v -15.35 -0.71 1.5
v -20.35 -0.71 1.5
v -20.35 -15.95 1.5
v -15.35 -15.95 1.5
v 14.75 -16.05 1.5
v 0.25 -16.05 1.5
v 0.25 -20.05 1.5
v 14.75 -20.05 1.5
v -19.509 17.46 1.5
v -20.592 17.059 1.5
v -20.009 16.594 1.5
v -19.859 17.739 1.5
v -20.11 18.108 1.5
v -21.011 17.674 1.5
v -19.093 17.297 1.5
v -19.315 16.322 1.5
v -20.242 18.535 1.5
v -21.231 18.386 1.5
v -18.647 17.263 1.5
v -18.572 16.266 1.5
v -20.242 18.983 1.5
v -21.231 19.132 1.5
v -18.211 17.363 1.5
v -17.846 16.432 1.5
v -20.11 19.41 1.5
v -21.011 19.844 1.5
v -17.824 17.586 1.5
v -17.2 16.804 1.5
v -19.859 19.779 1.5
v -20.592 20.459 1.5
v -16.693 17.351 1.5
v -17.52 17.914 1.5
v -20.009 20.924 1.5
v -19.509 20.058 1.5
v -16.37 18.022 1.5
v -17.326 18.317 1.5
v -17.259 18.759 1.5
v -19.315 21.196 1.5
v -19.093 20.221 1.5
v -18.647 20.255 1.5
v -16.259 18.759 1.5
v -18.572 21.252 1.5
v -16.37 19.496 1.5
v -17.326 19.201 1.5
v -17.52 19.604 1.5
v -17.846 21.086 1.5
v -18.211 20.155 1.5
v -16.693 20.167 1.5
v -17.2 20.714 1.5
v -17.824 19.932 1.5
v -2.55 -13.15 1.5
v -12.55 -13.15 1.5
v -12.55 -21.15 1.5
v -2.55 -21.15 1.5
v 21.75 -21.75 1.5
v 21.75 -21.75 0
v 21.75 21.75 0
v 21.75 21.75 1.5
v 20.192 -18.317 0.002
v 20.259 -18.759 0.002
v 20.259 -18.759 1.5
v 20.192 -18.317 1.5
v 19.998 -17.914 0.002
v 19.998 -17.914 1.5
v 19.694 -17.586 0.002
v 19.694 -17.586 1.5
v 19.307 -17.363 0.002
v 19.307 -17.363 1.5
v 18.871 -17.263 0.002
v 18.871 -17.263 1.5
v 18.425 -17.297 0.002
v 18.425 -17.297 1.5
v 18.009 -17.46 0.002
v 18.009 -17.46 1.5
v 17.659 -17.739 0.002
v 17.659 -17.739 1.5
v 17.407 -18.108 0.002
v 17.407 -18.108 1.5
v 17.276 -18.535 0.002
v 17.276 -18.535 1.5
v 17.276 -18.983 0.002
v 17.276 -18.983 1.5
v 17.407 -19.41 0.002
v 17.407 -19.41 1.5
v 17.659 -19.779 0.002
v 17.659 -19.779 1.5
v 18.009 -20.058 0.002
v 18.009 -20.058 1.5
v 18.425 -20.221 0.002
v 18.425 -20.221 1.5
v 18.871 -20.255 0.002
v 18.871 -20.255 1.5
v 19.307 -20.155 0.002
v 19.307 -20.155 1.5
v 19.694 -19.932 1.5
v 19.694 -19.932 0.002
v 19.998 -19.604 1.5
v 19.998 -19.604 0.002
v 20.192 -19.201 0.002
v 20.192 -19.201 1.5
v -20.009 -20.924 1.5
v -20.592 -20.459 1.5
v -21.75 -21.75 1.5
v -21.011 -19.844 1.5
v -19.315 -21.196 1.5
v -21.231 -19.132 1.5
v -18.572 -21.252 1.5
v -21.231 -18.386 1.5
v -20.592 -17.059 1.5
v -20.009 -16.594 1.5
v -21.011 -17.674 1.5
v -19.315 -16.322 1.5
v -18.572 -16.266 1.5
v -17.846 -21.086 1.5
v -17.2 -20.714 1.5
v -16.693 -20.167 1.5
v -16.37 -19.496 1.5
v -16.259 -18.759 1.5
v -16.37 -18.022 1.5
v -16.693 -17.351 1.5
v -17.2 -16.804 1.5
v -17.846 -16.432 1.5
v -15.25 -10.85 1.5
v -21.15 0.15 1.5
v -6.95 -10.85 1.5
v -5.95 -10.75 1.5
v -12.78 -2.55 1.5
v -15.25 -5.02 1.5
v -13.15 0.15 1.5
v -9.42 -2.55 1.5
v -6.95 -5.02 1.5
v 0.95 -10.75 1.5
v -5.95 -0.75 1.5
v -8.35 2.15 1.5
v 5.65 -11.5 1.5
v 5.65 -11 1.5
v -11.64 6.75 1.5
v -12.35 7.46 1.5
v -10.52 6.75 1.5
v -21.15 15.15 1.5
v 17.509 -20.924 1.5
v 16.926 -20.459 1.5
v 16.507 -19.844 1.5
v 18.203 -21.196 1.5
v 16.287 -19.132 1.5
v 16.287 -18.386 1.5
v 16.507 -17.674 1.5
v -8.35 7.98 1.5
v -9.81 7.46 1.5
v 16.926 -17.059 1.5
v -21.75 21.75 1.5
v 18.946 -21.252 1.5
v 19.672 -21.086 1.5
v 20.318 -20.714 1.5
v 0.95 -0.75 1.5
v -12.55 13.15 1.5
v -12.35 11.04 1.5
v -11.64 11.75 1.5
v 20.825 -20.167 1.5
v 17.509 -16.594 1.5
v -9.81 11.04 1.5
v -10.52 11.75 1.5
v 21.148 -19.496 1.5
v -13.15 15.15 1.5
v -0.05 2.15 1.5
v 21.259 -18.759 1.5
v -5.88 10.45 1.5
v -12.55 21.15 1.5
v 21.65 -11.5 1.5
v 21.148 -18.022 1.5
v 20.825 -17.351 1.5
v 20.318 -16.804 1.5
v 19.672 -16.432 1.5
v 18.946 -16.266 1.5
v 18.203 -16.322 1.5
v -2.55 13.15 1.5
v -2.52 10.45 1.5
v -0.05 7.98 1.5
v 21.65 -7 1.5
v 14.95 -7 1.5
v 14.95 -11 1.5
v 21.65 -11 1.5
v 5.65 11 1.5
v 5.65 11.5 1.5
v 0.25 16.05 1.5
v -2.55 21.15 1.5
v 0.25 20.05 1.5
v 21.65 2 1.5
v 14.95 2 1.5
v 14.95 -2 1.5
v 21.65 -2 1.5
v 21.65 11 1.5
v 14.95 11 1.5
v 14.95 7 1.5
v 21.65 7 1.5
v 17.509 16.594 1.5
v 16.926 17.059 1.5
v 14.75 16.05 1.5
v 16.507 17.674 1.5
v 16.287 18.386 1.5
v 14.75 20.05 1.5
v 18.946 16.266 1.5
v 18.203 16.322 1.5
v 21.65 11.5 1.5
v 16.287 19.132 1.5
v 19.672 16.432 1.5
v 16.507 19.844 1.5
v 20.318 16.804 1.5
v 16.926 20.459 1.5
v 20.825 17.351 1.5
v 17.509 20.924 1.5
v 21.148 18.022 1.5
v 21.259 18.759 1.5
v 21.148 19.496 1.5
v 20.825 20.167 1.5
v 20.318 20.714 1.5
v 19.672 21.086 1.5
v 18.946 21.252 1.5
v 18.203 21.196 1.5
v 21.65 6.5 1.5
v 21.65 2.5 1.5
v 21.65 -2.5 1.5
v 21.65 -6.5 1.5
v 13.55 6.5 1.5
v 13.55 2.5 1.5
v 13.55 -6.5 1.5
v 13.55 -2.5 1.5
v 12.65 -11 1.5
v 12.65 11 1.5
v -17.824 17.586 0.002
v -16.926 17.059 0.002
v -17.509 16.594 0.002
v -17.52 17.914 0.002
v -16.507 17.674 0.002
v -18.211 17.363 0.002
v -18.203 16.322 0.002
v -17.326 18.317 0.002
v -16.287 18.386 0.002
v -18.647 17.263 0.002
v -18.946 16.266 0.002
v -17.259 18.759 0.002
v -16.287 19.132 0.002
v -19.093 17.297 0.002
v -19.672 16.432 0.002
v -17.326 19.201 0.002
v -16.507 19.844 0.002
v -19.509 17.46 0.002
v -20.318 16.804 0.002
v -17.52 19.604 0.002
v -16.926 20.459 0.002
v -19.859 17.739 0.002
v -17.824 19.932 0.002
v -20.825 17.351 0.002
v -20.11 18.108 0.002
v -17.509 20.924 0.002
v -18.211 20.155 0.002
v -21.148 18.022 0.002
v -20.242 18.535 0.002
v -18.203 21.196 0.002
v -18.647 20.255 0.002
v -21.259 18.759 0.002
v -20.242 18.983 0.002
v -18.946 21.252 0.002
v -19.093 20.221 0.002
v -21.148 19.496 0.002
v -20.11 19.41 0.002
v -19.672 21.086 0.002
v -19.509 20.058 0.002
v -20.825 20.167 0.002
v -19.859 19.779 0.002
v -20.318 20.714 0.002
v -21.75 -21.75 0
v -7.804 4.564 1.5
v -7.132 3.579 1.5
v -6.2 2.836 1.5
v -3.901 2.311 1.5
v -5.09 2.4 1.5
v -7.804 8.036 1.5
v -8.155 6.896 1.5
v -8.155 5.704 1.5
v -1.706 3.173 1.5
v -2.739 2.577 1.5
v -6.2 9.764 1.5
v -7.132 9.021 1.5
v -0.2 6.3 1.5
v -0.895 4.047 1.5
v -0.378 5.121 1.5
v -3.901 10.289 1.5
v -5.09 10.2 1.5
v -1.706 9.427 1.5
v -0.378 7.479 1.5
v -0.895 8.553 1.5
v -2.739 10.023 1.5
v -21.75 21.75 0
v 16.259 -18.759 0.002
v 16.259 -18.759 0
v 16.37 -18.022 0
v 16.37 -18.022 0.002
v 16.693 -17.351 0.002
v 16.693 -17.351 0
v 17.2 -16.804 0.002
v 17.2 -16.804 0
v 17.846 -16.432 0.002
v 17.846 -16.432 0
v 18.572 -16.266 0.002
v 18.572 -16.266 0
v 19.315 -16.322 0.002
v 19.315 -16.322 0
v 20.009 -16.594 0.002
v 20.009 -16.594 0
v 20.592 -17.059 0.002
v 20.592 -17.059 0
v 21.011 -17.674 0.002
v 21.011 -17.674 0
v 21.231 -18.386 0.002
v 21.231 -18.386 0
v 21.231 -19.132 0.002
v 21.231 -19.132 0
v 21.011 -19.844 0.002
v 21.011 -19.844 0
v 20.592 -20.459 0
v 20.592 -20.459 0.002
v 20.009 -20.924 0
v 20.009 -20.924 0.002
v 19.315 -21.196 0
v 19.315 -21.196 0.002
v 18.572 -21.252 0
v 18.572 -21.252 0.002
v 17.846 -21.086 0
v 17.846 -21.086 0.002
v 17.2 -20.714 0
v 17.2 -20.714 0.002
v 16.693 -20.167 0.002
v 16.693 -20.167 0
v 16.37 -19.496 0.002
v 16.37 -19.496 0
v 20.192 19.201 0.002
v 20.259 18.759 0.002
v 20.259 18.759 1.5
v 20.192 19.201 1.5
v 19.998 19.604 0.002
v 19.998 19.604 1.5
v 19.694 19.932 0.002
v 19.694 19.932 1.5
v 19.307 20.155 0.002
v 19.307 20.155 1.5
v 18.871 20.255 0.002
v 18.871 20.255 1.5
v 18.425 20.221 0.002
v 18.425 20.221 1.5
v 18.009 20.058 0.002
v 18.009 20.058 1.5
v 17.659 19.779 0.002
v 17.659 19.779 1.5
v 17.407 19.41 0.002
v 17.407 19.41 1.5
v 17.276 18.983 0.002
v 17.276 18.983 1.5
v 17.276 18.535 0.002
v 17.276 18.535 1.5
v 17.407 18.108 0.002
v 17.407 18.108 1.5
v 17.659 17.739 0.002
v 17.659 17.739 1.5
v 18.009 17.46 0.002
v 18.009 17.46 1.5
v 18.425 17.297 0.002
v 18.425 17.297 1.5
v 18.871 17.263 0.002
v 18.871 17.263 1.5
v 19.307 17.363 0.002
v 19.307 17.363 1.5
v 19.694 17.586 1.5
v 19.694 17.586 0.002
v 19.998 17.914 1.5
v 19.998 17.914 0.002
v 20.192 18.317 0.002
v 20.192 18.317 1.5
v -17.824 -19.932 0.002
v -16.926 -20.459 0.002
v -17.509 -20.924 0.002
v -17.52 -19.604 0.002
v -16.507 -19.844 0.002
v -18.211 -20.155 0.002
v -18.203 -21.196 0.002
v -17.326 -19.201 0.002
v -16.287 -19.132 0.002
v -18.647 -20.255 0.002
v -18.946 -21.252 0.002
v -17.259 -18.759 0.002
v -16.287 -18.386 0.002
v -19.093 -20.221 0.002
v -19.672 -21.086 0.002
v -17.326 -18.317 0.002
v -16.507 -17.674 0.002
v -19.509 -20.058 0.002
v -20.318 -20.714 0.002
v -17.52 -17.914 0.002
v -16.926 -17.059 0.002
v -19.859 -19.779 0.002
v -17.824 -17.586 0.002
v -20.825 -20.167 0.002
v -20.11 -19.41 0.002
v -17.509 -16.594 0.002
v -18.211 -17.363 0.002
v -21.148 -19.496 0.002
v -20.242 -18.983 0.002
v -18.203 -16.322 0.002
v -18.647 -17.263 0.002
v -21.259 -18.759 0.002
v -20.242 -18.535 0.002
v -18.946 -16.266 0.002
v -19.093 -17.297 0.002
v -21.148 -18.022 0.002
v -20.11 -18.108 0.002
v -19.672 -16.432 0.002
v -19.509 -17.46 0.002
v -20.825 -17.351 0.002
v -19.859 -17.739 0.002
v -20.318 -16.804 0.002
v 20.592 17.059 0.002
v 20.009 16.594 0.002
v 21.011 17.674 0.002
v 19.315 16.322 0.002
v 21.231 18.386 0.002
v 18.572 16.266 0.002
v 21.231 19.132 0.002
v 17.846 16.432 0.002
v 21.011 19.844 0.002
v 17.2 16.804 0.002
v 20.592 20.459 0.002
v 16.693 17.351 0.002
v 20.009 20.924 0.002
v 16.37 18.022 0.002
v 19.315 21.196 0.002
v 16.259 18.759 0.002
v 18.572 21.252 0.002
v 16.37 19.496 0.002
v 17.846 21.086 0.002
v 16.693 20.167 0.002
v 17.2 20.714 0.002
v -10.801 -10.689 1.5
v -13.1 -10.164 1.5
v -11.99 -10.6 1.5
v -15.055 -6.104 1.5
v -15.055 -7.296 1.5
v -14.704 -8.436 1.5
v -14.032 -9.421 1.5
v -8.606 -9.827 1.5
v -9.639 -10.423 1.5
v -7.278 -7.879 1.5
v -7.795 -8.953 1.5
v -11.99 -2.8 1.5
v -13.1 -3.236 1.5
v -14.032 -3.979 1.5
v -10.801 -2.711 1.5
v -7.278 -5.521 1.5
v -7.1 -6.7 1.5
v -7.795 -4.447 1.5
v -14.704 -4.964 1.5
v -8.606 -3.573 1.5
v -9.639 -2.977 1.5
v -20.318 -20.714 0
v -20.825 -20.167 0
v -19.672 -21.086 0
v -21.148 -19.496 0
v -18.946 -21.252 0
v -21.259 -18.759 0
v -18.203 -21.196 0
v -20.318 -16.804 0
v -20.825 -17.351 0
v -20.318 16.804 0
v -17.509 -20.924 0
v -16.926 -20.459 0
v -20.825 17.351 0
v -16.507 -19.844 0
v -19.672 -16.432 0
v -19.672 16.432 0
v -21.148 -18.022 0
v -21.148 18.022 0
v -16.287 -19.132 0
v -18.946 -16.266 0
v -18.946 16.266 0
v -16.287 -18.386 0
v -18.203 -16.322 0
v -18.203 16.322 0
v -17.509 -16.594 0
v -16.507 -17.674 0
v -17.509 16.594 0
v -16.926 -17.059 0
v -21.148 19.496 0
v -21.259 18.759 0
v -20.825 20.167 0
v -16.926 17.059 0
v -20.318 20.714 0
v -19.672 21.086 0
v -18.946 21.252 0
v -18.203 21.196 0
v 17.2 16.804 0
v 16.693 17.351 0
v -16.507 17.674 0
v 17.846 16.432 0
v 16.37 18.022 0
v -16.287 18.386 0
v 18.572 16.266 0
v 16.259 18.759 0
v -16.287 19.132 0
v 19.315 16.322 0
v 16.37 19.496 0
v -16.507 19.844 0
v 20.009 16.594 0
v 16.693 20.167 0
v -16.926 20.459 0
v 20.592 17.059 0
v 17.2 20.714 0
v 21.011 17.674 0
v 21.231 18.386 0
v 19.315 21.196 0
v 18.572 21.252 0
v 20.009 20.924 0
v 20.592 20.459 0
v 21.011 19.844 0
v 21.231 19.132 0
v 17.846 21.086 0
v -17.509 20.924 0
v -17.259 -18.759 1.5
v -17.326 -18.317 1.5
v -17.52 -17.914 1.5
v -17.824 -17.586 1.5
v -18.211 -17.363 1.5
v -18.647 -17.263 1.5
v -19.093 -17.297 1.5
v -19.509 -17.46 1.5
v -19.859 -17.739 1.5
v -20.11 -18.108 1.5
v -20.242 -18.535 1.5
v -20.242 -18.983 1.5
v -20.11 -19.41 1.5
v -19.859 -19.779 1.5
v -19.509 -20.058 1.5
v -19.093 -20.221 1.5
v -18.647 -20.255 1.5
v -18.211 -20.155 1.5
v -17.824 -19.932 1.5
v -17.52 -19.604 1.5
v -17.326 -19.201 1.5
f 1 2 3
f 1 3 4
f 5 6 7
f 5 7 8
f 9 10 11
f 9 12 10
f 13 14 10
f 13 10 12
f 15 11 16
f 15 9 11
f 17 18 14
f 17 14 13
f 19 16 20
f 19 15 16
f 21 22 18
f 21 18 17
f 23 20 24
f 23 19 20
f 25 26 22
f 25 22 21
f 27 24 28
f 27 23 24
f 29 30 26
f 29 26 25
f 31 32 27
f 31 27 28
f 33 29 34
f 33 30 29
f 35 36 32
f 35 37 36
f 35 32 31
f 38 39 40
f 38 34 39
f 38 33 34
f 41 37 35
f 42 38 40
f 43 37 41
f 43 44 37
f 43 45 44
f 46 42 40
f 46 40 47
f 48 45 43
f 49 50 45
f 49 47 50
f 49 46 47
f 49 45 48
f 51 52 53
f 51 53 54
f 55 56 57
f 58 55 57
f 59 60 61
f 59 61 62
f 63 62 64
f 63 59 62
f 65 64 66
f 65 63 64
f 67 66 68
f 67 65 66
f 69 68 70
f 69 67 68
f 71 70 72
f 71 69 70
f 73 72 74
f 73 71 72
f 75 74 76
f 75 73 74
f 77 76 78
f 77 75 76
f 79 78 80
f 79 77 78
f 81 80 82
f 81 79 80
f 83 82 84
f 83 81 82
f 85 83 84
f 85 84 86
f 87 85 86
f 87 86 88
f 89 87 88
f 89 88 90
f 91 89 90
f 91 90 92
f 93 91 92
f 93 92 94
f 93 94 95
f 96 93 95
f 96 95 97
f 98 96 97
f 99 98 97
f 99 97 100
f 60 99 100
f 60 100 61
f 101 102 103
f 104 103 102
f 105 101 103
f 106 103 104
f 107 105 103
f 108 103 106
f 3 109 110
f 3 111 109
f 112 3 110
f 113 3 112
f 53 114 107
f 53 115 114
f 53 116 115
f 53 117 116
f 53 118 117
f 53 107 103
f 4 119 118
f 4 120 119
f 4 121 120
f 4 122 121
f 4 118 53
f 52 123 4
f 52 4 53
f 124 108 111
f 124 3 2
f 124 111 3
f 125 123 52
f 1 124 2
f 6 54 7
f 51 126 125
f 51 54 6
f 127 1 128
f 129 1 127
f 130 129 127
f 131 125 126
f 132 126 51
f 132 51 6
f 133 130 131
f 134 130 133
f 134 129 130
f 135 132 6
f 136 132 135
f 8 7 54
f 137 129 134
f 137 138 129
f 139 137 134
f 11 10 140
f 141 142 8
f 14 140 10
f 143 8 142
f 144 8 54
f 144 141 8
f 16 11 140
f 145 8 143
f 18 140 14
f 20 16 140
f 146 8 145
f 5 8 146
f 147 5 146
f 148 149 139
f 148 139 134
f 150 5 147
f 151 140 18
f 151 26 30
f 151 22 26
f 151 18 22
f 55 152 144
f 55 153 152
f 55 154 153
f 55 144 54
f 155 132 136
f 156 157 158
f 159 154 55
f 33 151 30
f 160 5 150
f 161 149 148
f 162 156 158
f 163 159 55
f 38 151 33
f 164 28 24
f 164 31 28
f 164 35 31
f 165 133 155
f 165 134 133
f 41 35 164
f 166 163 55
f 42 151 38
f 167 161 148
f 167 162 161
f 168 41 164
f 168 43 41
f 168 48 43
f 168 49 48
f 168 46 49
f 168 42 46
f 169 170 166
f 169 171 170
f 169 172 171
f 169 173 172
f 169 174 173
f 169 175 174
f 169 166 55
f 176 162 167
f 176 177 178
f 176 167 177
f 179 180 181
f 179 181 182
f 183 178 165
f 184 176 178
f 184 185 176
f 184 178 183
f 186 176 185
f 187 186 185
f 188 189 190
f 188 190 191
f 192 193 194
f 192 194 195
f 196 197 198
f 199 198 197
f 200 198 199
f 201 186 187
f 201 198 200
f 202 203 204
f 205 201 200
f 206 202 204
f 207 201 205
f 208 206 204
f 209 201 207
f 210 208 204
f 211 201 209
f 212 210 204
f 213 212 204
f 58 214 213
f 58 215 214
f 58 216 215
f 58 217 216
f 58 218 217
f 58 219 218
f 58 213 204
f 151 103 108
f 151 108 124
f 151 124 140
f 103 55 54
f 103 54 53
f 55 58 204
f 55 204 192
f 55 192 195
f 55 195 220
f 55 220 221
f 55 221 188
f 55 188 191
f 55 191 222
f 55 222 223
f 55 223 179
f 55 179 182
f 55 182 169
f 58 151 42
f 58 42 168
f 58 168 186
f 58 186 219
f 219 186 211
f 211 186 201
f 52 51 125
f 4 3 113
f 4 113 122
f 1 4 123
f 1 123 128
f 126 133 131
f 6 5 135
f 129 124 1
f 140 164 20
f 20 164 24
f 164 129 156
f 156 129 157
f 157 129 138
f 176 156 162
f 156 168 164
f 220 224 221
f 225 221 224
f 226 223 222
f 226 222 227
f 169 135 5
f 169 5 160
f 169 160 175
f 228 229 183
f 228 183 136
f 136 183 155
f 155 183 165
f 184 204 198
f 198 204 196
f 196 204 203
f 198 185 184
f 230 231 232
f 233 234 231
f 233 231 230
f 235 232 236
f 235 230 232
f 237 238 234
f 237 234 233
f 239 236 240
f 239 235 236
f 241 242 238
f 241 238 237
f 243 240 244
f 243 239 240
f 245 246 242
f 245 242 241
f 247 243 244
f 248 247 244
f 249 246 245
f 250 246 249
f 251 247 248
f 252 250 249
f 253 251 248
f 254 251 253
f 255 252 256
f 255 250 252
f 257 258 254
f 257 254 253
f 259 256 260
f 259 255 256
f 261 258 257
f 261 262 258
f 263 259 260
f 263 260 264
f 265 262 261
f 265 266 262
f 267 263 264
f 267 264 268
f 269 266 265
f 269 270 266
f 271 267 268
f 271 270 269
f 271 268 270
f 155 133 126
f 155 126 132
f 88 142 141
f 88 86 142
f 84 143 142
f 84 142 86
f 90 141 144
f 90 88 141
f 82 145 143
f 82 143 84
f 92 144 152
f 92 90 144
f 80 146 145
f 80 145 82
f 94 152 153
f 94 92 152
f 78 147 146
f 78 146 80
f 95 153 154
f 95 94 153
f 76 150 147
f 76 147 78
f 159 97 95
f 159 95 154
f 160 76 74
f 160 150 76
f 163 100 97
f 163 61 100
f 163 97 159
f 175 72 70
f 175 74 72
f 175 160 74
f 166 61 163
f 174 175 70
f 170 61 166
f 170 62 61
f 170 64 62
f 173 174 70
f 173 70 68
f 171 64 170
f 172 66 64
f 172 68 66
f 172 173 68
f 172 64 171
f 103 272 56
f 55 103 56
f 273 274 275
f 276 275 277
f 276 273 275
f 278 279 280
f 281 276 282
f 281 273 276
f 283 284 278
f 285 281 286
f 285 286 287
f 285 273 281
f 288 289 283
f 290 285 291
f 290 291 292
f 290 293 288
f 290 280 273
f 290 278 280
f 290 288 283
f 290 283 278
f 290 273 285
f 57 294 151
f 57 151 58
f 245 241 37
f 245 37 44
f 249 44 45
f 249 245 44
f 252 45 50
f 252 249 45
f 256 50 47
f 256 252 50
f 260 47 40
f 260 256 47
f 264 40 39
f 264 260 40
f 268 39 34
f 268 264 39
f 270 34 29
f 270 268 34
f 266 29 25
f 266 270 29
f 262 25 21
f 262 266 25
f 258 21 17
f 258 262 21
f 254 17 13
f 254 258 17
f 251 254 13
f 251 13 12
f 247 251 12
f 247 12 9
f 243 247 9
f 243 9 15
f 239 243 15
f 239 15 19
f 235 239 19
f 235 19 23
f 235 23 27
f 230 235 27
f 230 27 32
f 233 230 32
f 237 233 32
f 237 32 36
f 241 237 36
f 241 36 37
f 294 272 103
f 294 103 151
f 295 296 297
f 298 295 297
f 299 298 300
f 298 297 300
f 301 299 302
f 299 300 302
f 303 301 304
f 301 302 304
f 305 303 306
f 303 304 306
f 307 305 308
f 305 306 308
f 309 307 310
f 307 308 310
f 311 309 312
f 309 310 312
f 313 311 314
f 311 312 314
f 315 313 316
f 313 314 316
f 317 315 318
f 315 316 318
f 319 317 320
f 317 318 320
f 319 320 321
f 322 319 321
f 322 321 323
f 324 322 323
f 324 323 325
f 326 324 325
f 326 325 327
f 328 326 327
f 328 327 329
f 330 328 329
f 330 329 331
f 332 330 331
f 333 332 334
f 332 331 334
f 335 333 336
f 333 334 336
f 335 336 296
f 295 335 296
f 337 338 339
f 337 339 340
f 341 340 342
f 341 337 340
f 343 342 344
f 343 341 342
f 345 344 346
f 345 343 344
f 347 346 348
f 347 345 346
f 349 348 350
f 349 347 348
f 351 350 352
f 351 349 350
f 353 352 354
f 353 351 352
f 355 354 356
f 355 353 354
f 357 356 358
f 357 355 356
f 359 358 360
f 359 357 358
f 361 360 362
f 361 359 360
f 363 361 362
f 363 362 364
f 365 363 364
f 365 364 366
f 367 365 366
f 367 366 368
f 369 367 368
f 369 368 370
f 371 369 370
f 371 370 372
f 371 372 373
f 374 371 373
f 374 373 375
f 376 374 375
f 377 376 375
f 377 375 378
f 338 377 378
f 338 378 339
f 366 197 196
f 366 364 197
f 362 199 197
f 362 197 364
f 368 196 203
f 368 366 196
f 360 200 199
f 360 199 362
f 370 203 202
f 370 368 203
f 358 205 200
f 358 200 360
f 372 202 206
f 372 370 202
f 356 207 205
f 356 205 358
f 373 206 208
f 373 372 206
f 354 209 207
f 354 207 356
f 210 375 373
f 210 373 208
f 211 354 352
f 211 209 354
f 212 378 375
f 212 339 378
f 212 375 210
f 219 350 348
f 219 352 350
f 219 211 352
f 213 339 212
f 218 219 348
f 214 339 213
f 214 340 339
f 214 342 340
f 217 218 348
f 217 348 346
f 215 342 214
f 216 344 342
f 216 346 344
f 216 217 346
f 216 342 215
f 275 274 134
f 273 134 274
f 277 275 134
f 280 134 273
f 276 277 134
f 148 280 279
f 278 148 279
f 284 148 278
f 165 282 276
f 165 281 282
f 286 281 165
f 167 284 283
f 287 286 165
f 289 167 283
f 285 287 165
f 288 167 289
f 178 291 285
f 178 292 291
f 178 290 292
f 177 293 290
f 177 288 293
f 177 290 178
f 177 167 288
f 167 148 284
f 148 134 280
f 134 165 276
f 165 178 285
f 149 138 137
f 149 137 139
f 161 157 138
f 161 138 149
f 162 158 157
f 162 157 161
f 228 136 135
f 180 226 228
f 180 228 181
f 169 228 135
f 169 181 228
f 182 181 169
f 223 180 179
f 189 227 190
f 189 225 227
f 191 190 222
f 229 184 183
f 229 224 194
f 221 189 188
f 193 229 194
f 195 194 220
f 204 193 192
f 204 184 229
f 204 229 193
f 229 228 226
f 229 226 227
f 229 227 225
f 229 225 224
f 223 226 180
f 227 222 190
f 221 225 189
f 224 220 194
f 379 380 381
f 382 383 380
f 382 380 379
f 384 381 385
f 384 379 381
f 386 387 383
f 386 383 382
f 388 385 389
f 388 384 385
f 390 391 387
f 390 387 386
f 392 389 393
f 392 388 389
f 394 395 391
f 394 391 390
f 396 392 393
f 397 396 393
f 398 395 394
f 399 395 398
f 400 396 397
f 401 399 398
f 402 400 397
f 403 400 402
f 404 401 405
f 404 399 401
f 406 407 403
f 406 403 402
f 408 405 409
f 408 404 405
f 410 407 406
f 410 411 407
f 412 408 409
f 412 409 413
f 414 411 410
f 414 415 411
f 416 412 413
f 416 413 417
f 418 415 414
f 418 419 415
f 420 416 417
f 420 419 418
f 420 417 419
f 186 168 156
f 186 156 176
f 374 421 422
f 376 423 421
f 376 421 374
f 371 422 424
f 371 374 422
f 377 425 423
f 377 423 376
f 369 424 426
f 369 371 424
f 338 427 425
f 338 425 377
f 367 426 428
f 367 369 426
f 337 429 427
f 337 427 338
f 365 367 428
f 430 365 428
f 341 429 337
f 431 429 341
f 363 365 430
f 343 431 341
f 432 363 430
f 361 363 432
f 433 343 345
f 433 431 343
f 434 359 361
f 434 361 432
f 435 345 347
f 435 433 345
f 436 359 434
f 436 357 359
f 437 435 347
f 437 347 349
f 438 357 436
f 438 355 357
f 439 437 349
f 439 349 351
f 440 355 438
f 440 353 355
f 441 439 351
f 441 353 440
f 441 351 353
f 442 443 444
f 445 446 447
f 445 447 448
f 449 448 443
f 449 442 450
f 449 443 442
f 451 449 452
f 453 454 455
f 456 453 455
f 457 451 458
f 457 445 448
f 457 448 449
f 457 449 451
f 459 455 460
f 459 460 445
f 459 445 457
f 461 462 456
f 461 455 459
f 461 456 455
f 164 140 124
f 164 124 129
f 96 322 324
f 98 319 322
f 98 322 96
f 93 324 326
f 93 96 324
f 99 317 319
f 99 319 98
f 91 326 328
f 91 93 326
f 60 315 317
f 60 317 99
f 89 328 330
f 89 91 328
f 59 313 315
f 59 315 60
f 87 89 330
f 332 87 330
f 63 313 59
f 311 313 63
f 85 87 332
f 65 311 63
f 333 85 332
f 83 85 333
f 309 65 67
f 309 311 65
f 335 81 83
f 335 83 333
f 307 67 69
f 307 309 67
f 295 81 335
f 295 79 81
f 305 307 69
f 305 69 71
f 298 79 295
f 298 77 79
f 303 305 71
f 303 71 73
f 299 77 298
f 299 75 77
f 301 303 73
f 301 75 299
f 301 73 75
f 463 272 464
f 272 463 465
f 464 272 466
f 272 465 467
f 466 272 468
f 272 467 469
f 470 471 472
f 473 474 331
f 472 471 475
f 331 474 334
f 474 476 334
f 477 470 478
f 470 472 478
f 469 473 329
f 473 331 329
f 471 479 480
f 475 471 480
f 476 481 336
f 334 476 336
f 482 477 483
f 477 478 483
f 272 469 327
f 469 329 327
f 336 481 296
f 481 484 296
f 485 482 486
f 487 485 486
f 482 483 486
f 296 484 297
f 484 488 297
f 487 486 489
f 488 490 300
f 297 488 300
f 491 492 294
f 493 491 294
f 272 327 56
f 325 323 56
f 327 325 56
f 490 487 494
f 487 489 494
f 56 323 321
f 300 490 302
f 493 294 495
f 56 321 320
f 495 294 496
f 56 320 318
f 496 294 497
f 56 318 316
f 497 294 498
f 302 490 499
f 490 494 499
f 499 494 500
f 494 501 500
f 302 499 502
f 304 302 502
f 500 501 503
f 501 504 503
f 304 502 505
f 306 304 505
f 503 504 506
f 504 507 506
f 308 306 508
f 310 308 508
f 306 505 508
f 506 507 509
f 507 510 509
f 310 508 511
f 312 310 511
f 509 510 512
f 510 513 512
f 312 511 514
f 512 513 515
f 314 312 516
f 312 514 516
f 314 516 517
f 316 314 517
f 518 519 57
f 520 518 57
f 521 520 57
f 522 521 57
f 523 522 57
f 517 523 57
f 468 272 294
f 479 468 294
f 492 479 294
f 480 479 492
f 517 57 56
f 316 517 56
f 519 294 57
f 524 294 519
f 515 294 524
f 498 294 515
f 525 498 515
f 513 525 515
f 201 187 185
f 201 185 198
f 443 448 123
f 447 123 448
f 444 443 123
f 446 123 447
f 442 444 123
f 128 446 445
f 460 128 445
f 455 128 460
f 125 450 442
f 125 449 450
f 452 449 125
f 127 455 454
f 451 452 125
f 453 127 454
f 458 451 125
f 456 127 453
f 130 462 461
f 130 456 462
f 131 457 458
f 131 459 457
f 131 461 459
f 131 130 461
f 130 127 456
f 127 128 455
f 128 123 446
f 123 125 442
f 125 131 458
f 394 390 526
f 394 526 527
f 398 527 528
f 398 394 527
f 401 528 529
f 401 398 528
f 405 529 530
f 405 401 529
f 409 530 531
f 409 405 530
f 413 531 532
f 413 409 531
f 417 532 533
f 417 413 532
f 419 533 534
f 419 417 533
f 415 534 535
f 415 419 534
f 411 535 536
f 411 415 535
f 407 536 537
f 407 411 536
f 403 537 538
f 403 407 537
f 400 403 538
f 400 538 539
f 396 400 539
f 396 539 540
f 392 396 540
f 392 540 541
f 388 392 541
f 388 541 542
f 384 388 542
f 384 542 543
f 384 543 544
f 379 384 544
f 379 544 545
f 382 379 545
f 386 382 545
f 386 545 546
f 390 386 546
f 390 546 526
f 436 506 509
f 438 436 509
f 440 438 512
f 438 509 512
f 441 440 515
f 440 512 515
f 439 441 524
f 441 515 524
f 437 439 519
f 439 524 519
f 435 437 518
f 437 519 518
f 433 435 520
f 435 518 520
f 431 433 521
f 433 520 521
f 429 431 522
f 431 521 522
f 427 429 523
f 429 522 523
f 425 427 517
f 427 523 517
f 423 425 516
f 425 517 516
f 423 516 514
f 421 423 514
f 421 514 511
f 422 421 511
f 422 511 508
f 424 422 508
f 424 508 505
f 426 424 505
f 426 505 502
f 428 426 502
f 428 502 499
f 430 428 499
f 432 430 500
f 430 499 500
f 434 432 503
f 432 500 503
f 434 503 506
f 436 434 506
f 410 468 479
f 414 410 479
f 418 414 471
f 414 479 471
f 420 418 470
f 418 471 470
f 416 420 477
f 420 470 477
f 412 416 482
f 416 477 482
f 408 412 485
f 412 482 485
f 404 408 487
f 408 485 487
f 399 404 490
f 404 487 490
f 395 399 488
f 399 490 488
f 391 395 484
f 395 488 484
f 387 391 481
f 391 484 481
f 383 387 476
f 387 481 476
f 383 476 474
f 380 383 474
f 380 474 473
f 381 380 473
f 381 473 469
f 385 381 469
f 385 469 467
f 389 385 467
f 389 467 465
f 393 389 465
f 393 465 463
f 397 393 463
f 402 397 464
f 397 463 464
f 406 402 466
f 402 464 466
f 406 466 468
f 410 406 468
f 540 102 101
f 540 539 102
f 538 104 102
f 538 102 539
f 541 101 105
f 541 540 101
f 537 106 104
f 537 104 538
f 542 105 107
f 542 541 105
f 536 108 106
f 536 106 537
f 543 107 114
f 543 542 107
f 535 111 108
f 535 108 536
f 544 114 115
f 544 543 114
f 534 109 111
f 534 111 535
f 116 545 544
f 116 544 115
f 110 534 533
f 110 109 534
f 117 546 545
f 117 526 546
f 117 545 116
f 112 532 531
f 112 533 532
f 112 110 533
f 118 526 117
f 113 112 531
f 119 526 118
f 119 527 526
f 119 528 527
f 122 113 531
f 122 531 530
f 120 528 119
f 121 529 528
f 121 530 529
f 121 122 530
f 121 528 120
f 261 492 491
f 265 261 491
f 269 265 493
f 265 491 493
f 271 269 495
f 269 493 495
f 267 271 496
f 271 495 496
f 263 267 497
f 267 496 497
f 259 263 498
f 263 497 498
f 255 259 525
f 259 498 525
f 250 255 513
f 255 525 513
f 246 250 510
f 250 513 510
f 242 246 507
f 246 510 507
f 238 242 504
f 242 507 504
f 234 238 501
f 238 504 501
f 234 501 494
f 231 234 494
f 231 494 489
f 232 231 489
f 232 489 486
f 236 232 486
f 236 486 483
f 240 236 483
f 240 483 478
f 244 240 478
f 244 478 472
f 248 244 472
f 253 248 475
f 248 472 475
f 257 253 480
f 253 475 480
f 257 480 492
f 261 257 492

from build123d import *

# Parameters (mm, degrees)
SKETCH1_W           = 43.5
SKETCH1_H           = 43.5
SKETCH1_R           = 1.5
BOSS_EXTRUDE1_DEPTH = 1.5
SKETCH2_R           = 2.5
SKETCH2_R_2         = 1.5
CUT_EXTRUDE1_DEPTH  = 0.0001
SKETCH3_R           = 2.5
SKETCH3_R_2         = 1.5
CUT_EXTRUDE2_DEPTH  = 0.002
SKETCH4_W           = 7
SKETCH4_H           = 0.5
CUT_EXTRUDE4_DEPTH  = 0.0001
SKETCH6_W           = 8
SKETCH6_H           = 15
SKETCH6_W_2         = 10
SKETCH6_H_2         = 8
CUT_EXTRUDE5_DEPTH  = 0.0001
SKETCH8_R           = 4
CUT_EXTRUDE6_DEPTH  = 0.0001
SKETCH9_W           = 14.5
SKETCH9_H           = 4
CUT_EXTRUDE7_DEPTH  = 0.0001
SKETCH10_W          = 5
SKETCH10_H          = 15.24
CUT_EXTRUDE8_DEPTH  = 0.0001
SKETCH11_R          = 4
SKETCH11_W          = 14.5
SKETCH11_H          = 4
CUT_EXTRUDE9_DEPTH  = 0.0001
CUT_EXTRUDE10_DEPTH = 0.0001
SKETCH13_W          = 6.9
SKETCH13_H          = 10
CUT_EXTRUDE11_DEPTH = 0.0001


with BuildPart() as part:
    # Sketch1 → Boss-Extrude1 (new body)
    with BuildSketch(Plane.XY):
        Rectangle(SKETCH1_W, SKETCH1_H)
        with Locations((-18.758938316, 18.758938316)):
            Circle(SKETCH1_R, mode=Mode.SUBTRACT)
        with Locations((18.758938316, 18.758938316)):
            Circle(SKETCH1_R, mode=Mode.SUBTRACT)
        with Locations((18.758938316, -18.758938316)):
            Circle(SKETCH1_R, mode=Mode.SUBTRACT)
        with Locations((-18.758938316, -18.758938316)):
            Circle(SKETCH1_R, mode=Mode.SUBTRACT)
    extrude(amount=BOSS_EXTRUDE1_DEPTH)

    # Sketch2 → Cut-Extrude1 (cut)
    with BuildSketch(Plane.XY.offset(1.5)):
        with Locations((-18.758938316, 18.758938316)):
            Circle(SKETCH2_R)
        with Locations((-18.758938316, 18.758938316)):
            Circle(SKETCH2_R_2, mode=Mode.SUBTRACT)
        with Locations((18.758938316, 18.758938316)):
            Circle(SKETCH2_R)
        with Locations((18.758938316, 18.758938316)):
            Circle(SKETCH2_R_2, mode=Mode.SUBTRACT)
        with Locations((18.758938316, -18.758938316)):
            Circle(SKETCH2_R)
        with Locations((18.758938316, -18.758938316)):
            Circle(SKETCH2_R_2, mode=Mode.SUBTRACT)
        with Locations((-18.758938316, -18.758938316)):
            Circle(SKETCH2_R)
        with Locations((-18.758938316, -18.758938316)):
            Circle(SKETCH2_R_2, mode=Mode.SUBTRACT)
    extrude(amount=-CUT_EXTRUDE1_DEPTH, mode=Mode.SUBTRACT)

    # Sketch3 → Cut-Extrude2 (cut)
    with BuildSketch(Plane(origin=(0, 0, 0), x_dir=(-1, 0, 0), z_dir=(0, 0, -1))):
        with Locations((-18.758938316, -18.758938316)):
            Circle(SKETCH3_R)
        with Locations((-18.758938316, -18.758938316)):
            Circle(SKETCH3_R_2, mode=Mode.SUBTRACT)
        with Locations((-18.758938316, 18.758938316)):
            Circle(SKETCH3_R)
        with Locations((-18.758938316, 18.758938316)):
            Circle(SKETCH3_R_2, mode=Mode.SUBTRACT)
        with Locations((18.758938316, 18.758938316)):
            Circle(SKETCH3_R)
        with Locations((18.758938316, 18.758938316)):
            Circle(SKETCH3_R_2, mode=Mode.SUBTRACT)
        with Locations((18.758938316, -18.758938316)):
            Circle(SKETCH3_R)
        with Locations((18.758938316, -18.758938316)):
            Circle(SKETCH3_R_2, mode=Mode.SUBTRACT)
    extrude(amount=-CUT_EXTRUDE2_DEPTH, mode=Mode.SUBTRACT)

    # Sketch4 → Cut-Extrude4 (cut)
    with BuildSketch(Plane.XY.offset(1.5)):
        Polygon((14.95, 11), (21.65, 11), (21.65, 11.5), (12.65, 11.5), (12.65, 11), (12.65, -11), (12.65, -11.5), (21.65, -11.5), (21.65, -11), (14.95, -11), (14.95, -7), (21.65, -7), (21.65, -6.5), (13.55, -6.5), (13.55, -2.5), (21.65, -2.5), (21.65, -2), (14.95, -2), (14.95, 2), (21.65, 2), (21.65, 2.5), (13.55, 2.5), (13.55, 6.5), (21.65, 6.5), (21.65, 7), (14.95, 7), align=None)
        with Locations((9.15, 11.25)):
            Rectangle(SKETCH4_W, SKETCH4_H)
        with Locations((9.15, -11.25)):
            Rectangle(SKETCH4_W, SKETCH4_H)
    extrude(amount=-CUT_EXTRUDE4_DEPTH, mode=Mode.SUBTRACT)

    # Sketch6 → Cut-Extrude5 (cut)
    with BuildSketch(Plane.XY.offset(1.5)):
        with Locations((-17.15, 7.65)):
            Rectangle(SKETCH6_W, SKETCH6_H)
        with Locations((-7.55, 17.15)):
            Rectangle(SKETCH6_W_2, SKETCH6_H_2)
        with Locations((-7.55, -17.15)):
            Rectangle(SKETCH6_W_2, SKETCH6_H_2)
    extrude(amount=-CUT_EXTRUDE5_DEPTH, mode=Mode.SUBTRACT)

    # Sketch8 → Cut-Extrude6 (cut)
    with BuildSketch(Plane.XY.offset(1.5)):
        Polygon((-0.05, 7.98), (-2.52, 10.45), (-5.88, 10.45), (-8.35, 7.98), (-8.35, 2.15), (-0.05, 2.15), align=None)
        with Locations((-4.2, 6.3)):
            Circle(SKETCH8_R, mode=Mode.SUBTRACT)
    extrude(amount=-CUT_EXTRUDE6_DEPTH, mode=Mode.SUBTRACT)

    # Sketch9 → Cut-Extrude7 (cut)
    with BuildSketch(Plane.XY.offset(1.5)):
        with Locations((7.5, 18.05)):
            Rectangle(SKETCH9_W, SKETCH9_H)
    extrude(amount=-CUT_EXTRUDE7_DEPTH, mode=Mode.SUBTRACT)

    # Sketch10 → Cut-Extrude8 (cut)
    with BuildSketch(Plane.XY.offset(1.5)):
        with Locations((-17.85, -8.33)):
            Rectangle(SKETCH10_W, SKETCH10_H)
    extrude(amount=-CUT_EXTRUDE8_DEPTH, mode=Mode.SUBTRACT)

    # Sketch11 → Cut-Extrude9 (cut)
    with BuildSketch(Plane.XY.offset(1.5)):
        Polygon((-9.42, -2.55), (-12.78, -2.55), (-15.25, -5.02), (-15.25, -10.85), (-6.95, -10.85), (-6.95, -5.02), align=None)
        with Locations((-11.1, -6.7)):
            Circle(SKETCH11_R, mode=Mode.SUBTRACT)
        with Locations((7.5, -18.05)):
            Rectangle(SKETCH11_W, SKETCH11_H)
    extrude(amount=-CUT_EXTRUDE9_DEPTH, mode=Mode.SUBTRACT)

    # Sketch12 → Cut-Extrude10 (cut)
    with BuildSketch(Plane.XY.offset(1.5)):
        Polygon((-9.81, 11.04), (-10.52, 11.75), (-11.64, 11.75), (-12.35, 11.04), (-12.35, 7.46), (-11.64, 6.75), (-10.52, 6.75), (-9.81, 7.46), align=None)
    extrude(amount=-CUT_EXTRUDE10_DEPTH, mode=Mode.SUBTRACT)

    # Sketch13 → Cut-Extrude11 (cut)
    with BuildSketch(Plane.XY.offset(1.5)):
        with Locations((-2.5, -5.75)):
            Rectangle(SKETCH13_W, SKETCH13_H)
    extrude(amount=-CUT_EXTRUDE11_DEPTH, mode=Mode.SUBTRACT)


solid = part.part
